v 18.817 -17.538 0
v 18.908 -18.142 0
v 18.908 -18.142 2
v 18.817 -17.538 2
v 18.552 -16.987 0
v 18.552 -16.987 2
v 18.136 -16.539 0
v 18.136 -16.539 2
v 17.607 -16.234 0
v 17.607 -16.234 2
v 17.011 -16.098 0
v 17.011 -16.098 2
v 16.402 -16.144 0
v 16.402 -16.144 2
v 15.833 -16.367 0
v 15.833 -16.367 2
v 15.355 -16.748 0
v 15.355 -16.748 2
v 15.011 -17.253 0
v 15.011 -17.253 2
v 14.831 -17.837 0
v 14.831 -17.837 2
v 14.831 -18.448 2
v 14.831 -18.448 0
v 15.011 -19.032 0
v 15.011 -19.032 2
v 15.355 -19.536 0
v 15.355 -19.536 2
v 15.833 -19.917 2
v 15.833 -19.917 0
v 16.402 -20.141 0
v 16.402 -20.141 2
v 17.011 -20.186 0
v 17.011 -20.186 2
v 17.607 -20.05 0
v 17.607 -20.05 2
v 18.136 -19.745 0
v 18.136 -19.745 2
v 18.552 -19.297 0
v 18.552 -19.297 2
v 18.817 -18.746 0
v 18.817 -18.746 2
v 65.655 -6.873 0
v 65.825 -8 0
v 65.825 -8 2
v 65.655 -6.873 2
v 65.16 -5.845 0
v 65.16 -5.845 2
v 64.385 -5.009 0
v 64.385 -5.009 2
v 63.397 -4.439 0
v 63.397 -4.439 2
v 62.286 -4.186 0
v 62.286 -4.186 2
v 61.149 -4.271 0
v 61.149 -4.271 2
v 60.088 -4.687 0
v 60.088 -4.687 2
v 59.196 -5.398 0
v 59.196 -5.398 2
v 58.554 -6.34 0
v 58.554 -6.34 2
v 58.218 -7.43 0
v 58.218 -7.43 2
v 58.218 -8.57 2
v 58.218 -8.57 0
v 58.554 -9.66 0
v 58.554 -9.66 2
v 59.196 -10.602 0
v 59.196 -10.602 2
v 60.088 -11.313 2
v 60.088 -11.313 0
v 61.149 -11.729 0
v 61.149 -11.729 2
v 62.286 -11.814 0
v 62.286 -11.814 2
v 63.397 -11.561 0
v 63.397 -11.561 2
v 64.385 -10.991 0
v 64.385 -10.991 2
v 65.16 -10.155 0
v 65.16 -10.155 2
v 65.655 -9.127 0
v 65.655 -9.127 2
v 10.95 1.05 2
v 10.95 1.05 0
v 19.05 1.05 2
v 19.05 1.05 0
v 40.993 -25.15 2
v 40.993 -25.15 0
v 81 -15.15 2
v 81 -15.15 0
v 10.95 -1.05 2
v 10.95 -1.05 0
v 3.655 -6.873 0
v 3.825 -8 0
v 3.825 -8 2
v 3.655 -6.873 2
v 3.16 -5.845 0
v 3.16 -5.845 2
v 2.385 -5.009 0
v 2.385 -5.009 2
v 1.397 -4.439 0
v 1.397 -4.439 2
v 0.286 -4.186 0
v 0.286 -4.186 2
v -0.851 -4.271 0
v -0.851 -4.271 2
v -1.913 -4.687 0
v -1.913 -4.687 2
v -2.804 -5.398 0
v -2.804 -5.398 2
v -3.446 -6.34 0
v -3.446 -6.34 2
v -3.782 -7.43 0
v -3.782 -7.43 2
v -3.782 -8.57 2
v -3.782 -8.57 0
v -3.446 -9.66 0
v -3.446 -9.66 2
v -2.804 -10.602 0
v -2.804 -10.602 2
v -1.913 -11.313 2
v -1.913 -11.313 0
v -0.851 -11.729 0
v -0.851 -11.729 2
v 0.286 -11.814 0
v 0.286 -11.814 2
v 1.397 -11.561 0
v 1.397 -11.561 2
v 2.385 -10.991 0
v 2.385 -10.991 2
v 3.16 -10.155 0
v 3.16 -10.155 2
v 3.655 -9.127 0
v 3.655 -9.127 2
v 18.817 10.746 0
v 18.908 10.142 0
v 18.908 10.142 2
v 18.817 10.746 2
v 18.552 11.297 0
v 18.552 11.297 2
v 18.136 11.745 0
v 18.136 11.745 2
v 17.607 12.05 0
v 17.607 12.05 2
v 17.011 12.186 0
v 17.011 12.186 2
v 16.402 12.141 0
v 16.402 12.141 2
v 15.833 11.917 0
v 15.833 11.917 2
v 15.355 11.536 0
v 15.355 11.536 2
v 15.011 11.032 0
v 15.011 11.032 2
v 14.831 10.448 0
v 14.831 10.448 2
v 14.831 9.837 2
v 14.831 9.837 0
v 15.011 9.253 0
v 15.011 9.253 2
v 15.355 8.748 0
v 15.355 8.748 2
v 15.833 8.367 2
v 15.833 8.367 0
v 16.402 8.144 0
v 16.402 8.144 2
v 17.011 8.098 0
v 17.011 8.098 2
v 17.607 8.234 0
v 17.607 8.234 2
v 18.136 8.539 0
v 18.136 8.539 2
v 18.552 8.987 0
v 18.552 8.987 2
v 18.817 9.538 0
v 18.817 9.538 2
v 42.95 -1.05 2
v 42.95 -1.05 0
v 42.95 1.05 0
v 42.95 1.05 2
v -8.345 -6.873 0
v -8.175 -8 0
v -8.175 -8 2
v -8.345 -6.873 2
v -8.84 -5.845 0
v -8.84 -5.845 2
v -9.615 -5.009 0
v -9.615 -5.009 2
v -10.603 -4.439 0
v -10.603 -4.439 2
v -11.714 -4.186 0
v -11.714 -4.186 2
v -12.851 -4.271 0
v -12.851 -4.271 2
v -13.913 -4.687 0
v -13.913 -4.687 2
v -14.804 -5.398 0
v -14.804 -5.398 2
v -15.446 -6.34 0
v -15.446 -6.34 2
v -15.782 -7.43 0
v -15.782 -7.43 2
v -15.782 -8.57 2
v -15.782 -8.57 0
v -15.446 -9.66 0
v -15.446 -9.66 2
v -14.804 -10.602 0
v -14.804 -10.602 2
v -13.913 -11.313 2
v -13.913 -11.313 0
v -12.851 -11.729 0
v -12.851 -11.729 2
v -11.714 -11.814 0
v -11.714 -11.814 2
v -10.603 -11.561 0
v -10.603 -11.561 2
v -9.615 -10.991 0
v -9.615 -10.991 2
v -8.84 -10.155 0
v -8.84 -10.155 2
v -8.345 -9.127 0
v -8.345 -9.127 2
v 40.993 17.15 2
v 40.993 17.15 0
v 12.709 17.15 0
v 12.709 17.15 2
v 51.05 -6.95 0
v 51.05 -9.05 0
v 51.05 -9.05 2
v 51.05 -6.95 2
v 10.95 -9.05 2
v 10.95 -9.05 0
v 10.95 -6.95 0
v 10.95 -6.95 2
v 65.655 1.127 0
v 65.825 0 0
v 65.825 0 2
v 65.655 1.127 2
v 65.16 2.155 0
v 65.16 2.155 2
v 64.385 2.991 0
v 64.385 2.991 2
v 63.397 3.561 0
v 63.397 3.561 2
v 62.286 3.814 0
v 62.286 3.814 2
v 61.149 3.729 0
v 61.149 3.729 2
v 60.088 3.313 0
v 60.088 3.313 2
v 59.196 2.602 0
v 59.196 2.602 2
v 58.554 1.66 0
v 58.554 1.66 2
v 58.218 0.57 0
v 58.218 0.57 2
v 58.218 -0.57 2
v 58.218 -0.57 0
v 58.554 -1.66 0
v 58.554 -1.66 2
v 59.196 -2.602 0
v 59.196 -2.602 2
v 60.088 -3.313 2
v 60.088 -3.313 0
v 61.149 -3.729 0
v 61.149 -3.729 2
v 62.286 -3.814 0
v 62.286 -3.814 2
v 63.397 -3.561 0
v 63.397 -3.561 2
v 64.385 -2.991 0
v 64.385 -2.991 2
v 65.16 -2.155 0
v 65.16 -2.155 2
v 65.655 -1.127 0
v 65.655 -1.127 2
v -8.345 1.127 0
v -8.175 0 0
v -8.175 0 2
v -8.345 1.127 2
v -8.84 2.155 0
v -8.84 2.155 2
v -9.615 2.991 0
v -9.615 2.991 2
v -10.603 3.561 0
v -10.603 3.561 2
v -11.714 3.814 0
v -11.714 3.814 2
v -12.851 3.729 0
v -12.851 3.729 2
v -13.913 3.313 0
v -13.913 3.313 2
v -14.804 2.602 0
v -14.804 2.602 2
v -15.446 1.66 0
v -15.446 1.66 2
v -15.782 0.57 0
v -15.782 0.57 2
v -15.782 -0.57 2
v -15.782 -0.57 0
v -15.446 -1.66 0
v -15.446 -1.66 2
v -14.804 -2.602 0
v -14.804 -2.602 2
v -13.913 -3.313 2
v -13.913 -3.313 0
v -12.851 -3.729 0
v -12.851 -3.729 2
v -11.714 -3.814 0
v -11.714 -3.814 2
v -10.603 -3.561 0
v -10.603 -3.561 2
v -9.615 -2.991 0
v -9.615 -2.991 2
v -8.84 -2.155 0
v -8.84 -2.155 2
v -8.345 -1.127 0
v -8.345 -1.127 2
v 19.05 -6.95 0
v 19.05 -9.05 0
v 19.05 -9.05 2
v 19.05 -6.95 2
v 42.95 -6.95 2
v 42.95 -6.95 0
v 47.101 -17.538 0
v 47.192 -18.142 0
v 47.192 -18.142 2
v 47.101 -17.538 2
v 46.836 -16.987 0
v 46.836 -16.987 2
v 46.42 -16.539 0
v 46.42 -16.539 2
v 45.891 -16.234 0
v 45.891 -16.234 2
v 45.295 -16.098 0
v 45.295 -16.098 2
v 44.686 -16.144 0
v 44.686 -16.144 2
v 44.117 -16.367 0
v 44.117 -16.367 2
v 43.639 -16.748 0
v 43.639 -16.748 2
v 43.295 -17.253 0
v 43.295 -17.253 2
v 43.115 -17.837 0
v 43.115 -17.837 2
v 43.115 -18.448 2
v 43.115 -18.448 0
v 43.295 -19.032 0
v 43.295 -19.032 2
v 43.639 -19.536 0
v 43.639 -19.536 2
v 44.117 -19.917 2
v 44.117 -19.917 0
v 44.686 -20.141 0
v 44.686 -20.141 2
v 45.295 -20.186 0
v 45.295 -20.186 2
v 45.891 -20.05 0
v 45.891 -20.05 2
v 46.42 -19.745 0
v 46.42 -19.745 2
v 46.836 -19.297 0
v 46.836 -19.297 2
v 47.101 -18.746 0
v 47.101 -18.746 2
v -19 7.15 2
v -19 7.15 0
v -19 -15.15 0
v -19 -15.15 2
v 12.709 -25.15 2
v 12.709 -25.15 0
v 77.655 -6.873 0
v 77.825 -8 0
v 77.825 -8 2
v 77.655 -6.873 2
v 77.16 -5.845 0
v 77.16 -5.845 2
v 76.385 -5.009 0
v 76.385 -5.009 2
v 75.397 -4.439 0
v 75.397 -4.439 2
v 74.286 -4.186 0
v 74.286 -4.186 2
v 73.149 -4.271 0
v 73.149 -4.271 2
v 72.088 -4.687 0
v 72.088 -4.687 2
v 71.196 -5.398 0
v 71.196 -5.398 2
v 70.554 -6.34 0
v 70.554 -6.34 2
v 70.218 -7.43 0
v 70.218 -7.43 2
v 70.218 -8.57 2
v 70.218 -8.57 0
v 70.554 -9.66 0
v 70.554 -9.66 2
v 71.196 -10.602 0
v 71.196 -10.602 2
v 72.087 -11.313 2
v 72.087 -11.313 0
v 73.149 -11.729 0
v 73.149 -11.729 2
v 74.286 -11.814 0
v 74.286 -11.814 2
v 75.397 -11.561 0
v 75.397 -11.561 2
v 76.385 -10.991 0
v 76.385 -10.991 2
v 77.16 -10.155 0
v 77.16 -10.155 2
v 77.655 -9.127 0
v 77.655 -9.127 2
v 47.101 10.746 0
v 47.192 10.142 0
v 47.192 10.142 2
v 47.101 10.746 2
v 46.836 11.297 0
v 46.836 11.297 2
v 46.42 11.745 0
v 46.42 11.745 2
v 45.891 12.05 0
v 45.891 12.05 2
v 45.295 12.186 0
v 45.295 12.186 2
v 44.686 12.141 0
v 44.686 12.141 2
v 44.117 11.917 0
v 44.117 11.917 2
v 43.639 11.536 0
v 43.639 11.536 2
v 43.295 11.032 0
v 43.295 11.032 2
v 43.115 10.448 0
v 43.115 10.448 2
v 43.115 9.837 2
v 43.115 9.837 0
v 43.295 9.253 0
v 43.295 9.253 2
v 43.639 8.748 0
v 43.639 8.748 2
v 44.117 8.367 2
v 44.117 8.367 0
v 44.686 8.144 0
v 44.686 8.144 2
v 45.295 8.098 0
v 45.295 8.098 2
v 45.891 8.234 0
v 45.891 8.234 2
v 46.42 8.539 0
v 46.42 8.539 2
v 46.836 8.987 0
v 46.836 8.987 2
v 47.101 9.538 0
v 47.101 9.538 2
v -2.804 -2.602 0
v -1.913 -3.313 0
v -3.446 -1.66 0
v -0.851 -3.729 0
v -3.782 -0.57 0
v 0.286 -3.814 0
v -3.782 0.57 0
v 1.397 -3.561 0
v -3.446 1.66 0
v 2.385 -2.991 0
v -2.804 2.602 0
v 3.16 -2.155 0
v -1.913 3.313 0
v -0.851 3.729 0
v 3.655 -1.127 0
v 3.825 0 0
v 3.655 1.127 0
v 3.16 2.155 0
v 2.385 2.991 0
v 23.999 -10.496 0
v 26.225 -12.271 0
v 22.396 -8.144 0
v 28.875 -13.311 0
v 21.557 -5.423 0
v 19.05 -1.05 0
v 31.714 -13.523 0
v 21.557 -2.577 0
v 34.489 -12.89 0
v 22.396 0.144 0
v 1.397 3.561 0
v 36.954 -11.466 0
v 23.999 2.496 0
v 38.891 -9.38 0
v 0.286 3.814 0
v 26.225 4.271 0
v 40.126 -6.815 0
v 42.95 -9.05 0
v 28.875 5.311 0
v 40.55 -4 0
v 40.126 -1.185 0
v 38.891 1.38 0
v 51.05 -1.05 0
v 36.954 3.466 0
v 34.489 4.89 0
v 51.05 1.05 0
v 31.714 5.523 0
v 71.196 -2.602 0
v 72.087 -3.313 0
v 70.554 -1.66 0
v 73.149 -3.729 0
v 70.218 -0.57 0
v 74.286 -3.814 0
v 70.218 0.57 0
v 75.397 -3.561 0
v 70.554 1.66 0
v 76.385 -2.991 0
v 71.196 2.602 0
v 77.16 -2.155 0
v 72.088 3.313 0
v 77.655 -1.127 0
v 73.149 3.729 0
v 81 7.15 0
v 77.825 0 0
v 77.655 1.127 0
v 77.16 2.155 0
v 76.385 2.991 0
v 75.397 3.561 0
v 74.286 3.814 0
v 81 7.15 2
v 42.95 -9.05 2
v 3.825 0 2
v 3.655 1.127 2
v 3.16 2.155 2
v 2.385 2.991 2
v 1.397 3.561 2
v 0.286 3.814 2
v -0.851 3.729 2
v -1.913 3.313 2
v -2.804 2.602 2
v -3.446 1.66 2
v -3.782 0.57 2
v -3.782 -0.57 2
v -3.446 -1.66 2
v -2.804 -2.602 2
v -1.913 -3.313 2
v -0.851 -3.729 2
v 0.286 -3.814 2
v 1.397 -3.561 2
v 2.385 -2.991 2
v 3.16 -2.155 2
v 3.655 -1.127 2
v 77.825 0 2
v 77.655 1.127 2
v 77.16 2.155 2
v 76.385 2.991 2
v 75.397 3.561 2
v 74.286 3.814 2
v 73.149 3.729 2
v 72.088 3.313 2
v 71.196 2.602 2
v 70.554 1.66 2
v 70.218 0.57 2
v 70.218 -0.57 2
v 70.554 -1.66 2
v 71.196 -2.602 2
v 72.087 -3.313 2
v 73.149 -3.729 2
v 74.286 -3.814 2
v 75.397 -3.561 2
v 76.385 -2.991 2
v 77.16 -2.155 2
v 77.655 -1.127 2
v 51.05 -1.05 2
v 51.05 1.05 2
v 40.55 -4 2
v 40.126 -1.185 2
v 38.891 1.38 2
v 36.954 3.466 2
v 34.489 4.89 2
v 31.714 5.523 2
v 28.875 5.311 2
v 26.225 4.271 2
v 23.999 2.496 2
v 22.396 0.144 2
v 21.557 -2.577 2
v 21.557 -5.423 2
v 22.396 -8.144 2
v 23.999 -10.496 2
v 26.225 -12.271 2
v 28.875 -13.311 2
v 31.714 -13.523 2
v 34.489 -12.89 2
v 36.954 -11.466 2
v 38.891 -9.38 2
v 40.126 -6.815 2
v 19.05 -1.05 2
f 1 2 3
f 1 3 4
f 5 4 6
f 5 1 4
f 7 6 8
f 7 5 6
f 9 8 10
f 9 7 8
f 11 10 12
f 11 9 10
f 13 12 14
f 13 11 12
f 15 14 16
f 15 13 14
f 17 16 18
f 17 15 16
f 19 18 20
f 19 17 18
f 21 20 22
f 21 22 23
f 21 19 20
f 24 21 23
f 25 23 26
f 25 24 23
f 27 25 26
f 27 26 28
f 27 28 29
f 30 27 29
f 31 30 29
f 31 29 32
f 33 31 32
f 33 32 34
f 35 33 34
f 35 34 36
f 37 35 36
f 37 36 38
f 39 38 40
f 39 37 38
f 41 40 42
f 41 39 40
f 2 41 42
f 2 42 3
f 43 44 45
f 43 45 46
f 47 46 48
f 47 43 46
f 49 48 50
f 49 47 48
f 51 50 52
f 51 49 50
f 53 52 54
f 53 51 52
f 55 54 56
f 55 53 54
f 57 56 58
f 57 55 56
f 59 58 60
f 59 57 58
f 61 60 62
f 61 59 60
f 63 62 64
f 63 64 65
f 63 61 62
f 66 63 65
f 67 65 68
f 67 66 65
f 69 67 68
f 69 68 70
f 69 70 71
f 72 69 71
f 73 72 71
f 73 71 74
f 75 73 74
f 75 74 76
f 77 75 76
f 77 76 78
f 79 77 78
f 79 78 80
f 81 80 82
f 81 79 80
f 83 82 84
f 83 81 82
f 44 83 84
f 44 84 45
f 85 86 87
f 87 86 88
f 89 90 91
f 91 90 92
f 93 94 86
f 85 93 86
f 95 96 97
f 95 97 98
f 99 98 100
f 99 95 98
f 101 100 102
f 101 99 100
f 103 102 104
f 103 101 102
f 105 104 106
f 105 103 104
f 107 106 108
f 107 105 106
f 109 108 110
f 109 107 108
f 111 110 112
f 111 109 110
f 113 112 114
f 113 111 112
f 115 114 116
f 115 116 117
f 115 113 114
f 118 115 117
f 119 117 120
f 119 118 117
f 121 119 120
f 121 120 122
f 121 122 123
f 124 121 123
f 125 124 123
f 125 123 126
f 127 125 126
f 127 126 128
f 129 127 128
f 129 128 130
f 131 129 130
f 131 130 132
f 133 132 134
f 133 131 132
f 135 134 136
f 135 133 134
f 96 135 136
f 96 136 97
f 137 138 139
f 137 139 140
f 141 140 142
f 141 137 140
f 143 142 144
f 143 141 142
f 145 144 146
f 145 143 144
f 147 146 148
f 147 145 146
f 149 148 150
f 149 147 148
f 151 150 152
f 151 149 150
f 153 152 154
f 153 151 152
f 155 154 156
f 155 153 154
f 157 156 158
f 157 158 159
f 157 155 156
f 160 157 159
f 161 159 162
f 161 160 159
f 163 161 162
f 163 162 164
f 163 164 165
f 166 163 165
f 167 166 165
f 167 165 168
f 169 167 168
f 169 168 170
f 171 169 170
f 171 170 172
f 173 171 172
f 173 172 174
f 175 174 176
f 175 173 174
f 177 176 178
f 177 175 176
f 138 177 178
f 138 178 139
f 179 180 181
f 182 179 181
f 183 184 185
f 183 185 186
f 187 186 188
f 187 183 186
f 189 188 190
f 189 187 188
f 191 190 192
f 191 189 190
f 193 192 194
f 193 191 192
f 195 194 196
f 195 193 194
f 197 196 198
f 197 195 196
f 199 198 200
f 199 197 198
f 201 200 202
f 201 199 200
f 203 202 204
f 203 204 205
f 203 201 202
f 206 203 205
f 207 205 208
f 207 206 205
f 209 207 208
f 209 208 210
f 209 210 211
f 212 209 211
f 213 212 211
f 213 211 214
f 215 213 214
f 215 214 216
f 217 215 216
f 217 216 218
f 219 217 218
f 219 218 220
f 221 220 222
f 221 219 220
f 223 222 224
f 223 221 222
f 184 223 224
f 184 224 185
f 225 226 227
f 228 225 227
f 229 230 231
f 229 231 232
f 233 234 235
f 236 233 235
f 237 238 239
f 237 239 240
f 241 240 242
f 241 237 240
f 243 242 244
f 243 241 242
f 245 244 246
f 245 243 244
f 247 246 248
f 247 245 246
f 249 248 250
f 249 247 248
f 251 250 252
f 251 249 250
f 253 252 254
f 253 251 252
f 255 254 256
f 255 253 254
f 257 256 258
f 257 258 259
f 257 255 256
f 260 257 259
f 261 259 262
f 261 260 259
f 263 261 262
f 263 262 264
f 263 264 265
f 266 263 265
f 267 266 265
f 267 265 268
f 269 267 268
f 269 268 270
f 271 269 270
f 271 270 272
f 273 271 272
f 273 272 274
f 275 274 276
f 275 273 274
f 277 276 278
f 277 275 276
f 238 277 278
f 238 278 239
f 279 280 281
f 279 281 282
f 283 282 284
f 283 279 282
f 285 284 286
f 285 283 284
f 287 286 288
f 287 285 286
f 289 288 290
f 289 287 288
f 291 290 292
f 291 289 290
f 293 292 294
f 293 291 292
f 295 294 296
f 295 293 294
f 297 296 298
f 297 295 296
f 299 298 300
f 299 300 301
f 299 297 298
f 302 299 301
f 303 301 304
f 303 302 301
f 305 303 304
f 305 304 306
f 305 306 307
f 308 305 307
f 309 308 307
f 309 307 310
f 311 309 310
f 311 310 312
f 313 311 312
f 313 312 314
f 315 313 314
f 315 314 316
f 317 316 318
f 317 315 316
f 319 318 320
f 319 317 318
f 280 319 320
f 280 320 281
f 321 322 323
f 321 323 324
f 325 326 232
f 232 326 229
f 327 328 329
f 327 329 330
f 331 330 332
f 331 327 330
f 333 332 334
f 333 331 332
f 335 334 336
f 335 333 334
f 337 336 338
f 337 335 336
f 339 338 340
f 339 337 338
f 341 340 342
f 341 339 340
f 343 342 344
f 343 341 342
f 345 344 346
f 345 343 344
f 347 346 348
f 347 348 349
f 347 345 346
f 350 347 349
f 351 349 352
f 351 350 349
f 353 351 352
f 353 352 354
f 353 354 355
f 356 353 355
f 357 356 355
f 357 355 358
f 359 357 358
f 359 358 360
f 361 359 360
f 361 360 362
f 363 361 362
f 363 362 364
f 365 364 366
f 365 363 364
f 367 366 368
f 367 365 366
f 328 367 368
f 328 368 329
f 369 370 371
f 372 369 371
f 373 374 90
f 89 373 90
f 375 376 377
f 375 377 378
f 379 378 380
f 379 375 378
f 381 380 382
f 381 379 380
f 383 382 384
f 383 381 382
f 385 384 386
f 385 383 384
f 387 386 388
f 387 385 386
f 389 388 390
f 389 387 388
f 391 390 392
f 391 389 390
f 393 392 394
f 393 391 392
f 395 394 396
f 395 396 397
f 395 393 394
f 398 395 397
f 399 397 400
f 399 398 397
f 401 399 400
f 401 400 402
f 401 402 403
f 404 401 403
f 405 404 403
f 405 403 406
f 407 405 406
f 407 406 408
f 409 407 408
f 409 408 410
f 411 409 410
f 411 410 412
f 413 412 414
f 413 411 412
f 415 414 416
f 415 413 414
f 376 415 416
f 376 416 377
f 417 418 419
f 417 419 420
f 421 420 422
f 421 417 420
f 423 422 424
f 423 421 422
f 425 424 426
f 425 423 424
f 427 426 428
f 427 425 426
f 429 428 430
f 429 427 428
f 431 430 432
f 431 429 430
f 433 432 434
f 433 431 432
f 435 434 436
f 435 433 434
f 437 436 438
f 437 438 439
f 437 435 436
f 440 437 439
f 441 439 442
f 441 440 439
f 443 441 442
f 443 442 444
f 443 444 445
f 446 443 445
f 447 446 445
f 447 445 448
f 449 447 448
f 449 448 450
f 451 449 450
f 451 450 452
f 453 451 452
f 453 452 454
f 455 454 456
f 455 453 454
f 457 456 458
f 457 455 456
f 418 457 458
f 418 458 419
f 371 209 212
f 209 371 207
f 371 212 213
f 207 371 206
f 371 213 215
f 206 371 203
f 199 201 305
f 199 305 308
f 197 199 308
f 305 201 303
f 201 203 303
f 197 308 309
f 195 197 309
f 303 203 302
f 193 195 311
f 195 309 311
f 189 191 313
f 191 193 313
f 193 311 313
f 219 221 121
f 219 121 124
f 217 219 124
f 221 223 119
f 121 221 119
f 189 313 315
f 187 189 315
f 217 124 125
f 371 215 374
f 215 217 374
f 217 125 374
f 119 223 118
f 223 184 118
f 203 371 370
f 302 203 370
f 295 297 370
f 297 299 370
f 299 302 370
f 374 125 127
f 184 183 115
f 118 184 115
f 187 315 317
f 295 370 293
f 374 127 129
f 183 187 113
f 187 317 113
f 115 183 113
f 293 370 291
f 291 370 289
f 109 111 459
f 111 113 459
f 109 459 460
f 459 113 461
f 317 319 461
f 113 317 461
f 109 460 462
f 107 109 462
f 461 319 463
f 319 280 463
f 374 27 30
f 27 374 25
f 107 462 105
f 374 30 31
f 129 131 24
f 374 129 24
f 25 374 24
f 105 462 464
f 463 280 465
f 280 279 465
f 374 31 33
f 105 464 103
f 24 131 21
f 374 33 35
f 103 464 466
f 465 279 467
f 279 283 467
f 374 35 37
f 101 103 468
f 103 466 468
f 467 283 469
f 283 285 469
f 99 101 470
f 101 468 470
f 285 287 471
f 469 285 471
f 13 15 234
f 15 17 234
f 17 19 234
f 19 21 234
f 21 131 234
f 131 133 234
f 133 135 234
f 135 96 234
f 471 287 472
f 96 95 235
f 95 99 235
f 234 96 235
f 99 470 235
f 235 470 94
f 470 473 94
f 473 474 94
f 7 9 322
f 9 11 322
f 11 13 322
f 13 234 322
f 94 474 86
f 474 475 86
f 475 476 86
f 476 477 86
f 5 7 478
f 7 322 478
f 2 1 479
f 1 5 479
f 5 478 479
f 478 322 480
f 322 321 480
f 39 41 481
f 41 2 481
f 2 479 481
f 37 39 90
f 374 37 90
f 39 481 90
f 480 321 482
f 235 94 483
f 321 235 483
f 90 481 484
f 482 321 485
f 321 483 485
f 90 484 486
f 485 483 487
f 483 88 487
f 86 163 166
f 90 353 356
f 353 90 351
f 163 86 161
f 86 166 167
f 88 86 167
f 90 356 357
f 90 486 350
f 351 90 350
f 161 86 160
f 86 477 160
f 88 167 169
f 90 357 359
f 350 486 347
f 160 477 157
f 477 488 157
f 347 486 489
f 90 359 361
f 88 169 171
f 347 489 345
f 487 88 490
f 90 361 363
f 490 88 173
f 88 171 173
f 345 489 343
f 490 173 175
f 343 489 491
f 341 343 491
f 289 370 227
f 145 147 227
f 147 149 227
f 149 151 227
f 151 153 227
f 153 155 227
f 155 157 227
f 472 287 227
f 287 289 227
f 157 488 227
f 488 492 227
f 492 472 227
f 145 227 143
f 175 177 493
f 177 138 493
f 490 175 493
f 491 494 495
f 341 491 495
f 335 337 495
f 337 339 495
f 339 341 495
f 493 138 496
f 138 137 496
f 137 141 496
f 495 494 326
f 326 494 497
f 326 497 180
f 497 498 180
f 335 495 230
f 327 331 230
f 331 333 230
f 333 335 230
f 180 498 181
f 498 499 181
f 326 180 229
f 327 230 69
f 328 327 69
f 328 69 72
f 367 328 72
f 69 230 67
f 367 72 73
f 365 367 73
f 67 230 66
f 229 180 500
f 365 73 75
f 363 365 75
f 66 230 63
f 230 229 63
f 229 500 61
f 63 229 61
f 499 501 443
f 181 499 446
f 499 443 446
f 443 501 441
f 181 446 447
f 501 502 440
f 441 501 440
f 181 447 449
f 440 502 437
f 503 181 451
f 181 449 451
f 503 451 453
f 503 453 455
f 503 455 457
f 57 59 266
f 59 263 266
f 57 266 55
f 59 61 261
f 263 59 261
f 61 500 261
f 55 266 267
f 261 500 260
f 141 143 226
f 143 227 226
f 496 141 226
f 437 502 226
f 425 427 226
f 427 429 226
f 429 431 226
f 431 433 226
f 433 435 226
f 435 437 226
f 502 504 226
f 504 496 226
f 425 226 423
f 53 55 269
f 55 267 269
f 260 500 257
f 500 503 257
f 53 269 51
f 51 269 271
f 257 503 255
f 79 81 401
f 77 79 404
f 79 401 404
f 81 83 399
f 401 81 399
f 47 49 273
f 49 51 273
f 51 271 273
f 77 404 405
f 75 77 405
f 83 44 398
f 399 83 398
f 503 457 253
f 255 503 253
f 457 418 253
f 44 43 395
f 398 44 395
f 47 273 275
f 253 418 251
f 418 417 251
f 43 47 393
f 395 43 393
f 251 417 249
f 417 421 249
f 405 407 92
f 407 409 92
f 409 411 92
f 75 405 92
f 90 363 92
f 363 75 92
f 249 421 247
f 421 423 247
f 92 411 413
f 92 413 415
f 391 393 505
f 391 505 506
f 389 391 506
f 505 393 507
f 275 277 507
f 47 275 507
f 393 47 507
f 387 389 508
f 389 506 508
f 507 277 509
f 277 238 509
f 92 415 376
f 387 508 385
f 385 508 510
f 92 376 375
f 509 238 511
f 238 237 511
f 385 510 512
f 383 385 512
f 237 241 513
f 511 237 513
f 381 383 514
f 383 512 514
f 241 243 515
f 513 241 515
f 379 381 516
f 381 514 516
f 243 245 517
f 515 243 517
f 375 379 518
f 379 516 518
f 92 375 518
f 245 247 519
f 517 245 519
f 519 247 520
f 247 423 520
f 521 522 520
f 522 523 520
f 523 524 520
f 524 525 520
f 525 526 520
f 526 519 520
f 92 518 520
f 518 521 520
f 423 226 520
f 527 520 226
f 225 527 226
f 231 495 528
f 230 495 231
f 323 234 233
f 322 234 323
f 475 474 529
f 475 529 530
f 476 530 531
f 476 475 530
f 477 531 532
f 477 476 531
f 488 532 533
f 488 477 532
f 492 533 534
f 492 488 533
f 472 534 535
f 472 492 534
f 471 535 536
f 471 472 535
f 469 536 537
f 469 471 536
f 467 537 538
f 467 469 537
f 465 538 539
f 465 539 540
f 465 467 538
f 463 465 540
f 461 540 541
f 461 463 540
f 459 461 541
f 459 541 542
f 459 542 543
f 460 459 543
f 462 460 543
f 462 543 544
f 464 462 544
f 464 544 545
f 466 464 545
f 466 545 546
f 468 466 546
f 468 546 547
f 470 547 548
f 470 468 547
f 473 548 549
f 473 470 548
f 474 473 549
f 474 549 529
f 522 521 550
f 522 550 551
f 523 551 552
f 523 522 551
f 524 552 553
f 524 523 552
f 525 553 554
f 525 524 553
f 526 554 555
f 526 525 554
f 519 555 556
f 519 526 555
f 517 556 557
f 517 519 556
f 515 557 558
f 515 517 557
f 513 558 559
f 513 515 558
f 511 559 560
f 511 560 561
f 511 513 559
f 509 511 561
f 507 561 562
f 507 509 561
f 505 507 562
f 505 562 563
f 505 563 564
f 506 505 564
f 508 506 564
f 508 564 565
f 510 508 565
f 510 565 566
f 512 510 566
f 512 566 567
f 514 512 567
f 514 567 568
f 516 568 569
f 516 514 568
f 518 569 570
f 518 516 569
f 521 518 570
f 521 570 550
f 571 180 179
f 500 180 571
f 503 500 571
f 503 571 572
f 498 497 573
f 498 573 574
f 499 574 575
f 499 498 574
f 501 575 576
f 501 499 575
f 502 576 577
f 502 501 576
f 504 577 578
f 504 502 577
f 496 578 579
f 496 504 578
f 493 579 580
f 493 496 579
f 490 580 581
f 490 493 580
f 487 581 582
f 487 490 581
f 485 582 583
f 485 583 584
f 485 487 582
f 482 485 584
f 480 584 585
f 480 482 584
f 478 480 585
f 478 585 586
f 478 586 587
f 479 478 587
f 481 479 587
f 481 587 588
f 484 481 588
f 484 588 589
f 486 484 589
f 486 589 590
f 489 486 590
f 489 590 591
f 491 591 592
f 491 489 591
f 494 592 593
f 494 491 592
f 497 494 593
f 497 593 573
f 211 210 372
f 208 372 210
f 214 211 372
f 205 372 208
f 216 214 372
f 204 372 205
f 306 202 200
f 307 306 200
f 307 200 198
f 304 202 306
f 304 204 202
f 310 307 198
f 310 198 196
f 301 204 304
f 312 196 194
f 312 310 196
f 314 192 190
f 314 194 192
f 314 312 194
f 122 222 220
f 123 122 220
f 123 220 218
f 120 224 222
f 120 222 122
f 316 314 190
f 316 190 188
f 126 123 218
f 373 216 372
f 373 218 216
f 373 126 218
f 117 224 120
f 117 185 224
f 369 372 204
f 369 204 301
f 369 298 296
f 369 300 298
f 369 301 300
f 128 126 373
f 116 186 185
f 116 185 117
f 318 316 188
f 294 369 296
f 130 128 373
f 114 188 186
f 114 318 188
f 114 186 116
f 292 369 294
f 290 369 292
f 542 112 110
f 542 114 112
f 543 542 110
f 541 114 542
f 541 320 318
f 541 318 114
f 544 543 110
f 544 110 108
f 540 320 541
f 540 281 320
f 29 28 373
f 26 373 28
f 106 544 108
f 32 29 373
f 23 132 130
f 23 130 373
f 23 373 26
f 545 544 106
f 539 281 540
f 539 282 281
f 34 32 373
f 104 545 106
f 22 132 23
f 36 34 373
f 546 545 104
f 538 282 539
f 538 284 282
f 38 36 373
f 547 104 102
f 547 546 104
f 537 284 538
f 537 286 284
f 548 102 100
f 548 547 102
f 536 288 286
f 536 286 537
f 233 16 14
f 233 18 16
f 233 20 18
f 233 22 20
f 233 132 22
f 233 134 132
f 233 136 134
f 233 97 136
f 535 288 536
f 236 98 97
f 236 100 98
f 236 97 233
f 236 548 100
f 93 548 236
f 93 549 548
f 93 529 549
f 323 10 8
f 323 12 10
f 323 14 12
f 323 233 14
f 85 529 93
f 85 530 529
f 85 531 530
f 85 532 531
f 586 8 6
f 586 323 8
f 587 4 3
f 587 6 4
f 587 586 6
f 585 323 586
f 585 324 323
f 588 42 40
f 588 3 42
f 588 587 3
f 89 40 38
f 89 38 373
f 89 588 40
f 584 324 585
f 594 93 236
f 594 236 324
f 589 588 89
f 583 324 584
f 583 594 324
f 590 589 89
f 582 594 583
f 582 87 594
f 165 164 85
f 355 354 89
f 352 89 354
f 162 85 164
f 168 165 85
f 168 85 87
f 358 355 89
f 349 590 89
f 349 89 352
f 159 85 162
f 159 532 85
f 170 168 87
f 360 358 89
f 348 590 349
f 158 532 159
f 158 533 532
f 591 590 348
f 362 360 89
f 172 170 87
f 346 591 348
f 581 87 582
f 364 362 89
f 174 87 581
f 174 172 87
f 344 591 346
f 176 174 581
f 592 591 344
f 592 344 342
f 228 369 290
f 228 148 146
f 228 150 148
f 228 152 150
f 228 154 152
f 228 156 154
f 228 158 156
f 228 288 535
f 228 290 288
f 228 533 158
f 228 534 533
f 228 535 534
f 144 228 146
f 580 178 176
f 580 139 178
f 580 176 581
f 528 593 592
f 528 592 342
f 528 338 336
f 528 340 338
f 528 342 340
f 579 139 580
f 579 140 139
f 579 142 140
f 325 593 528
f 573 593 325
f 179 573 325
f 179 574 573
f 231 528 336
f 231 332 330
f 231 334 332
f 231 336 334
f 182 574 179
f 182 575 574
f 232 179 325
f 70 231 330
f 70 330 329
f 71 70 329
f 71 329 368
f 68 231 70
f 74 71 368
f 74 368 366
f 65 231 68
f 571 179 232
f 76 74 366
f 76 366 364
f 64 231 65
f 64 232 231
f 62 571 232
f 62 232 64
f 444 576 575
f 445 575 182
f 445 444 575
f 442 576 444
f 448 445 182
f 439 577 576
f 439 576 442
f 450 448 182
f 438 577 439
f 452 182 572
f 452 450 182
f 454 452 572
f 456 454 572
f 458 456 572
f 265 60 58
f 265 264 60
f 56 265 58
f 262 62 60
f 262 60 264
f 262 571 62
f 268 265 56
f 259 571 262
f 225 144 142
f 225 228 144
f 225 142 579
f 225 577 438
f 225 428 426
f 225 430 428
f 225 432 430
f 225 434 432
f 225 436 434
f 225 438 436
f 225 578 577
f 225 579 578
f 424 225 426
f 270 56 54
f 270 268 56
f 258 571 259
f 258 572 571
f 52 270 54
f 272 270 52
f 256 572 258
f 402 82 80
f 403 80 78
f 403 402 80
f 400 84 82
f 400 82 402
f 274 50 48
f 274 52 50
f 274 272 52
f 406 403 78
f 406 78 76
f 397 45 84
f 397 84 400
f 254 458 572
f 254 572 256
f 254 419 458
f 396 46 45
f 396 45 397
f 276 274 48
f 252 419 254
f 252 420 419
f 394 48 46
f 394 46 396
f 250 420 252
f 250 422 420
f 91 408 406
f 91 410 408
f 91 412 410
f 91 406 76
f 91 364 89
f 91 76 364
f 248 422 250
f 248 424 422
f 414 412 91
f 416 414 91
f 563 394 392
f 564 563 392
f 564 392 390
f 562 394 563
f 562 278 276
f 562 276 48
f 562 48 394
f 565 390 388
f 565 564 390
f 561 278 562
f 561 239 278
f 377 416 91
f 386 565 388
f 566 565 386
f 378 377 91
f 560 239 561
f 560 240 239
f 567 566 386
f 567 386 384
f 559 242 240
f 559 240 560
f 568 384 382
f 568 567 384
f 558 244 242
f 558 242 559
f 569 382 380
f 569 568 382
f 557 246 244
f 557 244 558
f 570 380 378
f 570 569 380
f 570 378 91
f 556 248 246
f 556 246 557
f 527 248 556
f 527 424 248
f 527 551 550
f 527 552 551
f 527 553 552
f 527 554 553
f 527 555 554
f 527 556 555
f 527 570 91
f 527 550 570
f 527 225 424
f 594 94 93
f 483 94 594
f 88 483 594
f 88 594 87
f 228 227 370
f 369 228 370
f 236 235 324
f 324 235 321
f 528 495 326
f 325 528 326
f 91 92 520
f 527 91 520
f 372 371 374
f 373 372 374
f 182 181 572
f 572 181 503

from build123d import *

# Parameters (mm, degrees)
SKETCH_1_R      = 3.825
SKETCH_1_R_2    = 2.05
SKETCH_1_R_3    = 9.55
SKETCH_1_W      = 8.1
SKETCH_1_H      = 2.1
EXTRUDE_1_DEPTH = 2


with BuildPart() as part:
    # 草图1 → 凸台-拉伸1 (new body)
    with BuildSketch(Plane.XY):
        Polygon((81, -15.149736791), (81, 7.149736791), (40.992999038, 17.149736791), (12.70872779, 17.149736791), (-19, 7.149736791), (-19, -15.149736791), (12.70872779, -25.149736791), (40.992999038, -25.149736791), align=None)
        Circle(SKETCH_1_R, mode=Mode.SUBTRACT)
        with Locations((62, 0)):
            Circle(SKETCH_1_R, mode=Mode.SUBTRACT)
        with Locations((62, -8)):
            Circle(SKETCH_1_R, mode=Mode.SUBTRACT)
        with Locations((0, -8)):
            Circle(SKETCH_1_R, mode=Mode.SUBTRACT)
        with Locations((45.142135624, 10.142135624)):
            Circle(SKETCH_1_R_2, mode=Mode.SUBTRACT)
        with Locations((45.142135624, -18.142135624)):
            Circle(SKETCH_1_R_2, mode=Mode.SUBTRACT)
        with Locations((16.857864376, -18.142135624)):
            Circle(SKETCH_1_R_2, mode=Mode.SUBTRACT)
        with Locations((16.857864376, 10.142135624)):
            Circle(SKETCH_1_R_2, mode=Mode.SUBTRACT)
        with Locations((74, 0)):
            Circle(SKETCH_1_R, mode=Mode.SUBTRACT)
        with Locations((74, -8)):
            Circle(SKETCH_1_R, mode=Mode.SUBTRACT)
        with Locations((-12, -8)):
            Circle(SKETCH_1_R, mode=Mode.SUBTRACT)
        with Locations((-12, 0)):
            Circle(SKETCH_1_R, mode=Mode.SUBTRACT)
        with Locations((31, -4)):
            Circle(SKETCH_1_R_3, mode=Mode.SUBTRACT)
        with Locations((15, 0)):
            Rectangle(SKETCH_1_W, SKETCH_1_H, mode=Mode.SUBTRACT)
        with Locations((47, 0)):
            Rectangle(SKETCH_1_W, SKETCH_1_H, mode=Mode.SUBTRACT)
        with Locations((47, -8)):
            Rectangle(SKETCH_1_W, SKETCH_1_H, mode=Mode.SUBTRACT)
        with Locations((15, -8)):
            Rectangle(SKETCH_1_W, SKETCH_1_H, mode=Mode.SUBTRACT)
    extrude(amount=EXTRUDE_1_DEPTH)


solid = part.part
